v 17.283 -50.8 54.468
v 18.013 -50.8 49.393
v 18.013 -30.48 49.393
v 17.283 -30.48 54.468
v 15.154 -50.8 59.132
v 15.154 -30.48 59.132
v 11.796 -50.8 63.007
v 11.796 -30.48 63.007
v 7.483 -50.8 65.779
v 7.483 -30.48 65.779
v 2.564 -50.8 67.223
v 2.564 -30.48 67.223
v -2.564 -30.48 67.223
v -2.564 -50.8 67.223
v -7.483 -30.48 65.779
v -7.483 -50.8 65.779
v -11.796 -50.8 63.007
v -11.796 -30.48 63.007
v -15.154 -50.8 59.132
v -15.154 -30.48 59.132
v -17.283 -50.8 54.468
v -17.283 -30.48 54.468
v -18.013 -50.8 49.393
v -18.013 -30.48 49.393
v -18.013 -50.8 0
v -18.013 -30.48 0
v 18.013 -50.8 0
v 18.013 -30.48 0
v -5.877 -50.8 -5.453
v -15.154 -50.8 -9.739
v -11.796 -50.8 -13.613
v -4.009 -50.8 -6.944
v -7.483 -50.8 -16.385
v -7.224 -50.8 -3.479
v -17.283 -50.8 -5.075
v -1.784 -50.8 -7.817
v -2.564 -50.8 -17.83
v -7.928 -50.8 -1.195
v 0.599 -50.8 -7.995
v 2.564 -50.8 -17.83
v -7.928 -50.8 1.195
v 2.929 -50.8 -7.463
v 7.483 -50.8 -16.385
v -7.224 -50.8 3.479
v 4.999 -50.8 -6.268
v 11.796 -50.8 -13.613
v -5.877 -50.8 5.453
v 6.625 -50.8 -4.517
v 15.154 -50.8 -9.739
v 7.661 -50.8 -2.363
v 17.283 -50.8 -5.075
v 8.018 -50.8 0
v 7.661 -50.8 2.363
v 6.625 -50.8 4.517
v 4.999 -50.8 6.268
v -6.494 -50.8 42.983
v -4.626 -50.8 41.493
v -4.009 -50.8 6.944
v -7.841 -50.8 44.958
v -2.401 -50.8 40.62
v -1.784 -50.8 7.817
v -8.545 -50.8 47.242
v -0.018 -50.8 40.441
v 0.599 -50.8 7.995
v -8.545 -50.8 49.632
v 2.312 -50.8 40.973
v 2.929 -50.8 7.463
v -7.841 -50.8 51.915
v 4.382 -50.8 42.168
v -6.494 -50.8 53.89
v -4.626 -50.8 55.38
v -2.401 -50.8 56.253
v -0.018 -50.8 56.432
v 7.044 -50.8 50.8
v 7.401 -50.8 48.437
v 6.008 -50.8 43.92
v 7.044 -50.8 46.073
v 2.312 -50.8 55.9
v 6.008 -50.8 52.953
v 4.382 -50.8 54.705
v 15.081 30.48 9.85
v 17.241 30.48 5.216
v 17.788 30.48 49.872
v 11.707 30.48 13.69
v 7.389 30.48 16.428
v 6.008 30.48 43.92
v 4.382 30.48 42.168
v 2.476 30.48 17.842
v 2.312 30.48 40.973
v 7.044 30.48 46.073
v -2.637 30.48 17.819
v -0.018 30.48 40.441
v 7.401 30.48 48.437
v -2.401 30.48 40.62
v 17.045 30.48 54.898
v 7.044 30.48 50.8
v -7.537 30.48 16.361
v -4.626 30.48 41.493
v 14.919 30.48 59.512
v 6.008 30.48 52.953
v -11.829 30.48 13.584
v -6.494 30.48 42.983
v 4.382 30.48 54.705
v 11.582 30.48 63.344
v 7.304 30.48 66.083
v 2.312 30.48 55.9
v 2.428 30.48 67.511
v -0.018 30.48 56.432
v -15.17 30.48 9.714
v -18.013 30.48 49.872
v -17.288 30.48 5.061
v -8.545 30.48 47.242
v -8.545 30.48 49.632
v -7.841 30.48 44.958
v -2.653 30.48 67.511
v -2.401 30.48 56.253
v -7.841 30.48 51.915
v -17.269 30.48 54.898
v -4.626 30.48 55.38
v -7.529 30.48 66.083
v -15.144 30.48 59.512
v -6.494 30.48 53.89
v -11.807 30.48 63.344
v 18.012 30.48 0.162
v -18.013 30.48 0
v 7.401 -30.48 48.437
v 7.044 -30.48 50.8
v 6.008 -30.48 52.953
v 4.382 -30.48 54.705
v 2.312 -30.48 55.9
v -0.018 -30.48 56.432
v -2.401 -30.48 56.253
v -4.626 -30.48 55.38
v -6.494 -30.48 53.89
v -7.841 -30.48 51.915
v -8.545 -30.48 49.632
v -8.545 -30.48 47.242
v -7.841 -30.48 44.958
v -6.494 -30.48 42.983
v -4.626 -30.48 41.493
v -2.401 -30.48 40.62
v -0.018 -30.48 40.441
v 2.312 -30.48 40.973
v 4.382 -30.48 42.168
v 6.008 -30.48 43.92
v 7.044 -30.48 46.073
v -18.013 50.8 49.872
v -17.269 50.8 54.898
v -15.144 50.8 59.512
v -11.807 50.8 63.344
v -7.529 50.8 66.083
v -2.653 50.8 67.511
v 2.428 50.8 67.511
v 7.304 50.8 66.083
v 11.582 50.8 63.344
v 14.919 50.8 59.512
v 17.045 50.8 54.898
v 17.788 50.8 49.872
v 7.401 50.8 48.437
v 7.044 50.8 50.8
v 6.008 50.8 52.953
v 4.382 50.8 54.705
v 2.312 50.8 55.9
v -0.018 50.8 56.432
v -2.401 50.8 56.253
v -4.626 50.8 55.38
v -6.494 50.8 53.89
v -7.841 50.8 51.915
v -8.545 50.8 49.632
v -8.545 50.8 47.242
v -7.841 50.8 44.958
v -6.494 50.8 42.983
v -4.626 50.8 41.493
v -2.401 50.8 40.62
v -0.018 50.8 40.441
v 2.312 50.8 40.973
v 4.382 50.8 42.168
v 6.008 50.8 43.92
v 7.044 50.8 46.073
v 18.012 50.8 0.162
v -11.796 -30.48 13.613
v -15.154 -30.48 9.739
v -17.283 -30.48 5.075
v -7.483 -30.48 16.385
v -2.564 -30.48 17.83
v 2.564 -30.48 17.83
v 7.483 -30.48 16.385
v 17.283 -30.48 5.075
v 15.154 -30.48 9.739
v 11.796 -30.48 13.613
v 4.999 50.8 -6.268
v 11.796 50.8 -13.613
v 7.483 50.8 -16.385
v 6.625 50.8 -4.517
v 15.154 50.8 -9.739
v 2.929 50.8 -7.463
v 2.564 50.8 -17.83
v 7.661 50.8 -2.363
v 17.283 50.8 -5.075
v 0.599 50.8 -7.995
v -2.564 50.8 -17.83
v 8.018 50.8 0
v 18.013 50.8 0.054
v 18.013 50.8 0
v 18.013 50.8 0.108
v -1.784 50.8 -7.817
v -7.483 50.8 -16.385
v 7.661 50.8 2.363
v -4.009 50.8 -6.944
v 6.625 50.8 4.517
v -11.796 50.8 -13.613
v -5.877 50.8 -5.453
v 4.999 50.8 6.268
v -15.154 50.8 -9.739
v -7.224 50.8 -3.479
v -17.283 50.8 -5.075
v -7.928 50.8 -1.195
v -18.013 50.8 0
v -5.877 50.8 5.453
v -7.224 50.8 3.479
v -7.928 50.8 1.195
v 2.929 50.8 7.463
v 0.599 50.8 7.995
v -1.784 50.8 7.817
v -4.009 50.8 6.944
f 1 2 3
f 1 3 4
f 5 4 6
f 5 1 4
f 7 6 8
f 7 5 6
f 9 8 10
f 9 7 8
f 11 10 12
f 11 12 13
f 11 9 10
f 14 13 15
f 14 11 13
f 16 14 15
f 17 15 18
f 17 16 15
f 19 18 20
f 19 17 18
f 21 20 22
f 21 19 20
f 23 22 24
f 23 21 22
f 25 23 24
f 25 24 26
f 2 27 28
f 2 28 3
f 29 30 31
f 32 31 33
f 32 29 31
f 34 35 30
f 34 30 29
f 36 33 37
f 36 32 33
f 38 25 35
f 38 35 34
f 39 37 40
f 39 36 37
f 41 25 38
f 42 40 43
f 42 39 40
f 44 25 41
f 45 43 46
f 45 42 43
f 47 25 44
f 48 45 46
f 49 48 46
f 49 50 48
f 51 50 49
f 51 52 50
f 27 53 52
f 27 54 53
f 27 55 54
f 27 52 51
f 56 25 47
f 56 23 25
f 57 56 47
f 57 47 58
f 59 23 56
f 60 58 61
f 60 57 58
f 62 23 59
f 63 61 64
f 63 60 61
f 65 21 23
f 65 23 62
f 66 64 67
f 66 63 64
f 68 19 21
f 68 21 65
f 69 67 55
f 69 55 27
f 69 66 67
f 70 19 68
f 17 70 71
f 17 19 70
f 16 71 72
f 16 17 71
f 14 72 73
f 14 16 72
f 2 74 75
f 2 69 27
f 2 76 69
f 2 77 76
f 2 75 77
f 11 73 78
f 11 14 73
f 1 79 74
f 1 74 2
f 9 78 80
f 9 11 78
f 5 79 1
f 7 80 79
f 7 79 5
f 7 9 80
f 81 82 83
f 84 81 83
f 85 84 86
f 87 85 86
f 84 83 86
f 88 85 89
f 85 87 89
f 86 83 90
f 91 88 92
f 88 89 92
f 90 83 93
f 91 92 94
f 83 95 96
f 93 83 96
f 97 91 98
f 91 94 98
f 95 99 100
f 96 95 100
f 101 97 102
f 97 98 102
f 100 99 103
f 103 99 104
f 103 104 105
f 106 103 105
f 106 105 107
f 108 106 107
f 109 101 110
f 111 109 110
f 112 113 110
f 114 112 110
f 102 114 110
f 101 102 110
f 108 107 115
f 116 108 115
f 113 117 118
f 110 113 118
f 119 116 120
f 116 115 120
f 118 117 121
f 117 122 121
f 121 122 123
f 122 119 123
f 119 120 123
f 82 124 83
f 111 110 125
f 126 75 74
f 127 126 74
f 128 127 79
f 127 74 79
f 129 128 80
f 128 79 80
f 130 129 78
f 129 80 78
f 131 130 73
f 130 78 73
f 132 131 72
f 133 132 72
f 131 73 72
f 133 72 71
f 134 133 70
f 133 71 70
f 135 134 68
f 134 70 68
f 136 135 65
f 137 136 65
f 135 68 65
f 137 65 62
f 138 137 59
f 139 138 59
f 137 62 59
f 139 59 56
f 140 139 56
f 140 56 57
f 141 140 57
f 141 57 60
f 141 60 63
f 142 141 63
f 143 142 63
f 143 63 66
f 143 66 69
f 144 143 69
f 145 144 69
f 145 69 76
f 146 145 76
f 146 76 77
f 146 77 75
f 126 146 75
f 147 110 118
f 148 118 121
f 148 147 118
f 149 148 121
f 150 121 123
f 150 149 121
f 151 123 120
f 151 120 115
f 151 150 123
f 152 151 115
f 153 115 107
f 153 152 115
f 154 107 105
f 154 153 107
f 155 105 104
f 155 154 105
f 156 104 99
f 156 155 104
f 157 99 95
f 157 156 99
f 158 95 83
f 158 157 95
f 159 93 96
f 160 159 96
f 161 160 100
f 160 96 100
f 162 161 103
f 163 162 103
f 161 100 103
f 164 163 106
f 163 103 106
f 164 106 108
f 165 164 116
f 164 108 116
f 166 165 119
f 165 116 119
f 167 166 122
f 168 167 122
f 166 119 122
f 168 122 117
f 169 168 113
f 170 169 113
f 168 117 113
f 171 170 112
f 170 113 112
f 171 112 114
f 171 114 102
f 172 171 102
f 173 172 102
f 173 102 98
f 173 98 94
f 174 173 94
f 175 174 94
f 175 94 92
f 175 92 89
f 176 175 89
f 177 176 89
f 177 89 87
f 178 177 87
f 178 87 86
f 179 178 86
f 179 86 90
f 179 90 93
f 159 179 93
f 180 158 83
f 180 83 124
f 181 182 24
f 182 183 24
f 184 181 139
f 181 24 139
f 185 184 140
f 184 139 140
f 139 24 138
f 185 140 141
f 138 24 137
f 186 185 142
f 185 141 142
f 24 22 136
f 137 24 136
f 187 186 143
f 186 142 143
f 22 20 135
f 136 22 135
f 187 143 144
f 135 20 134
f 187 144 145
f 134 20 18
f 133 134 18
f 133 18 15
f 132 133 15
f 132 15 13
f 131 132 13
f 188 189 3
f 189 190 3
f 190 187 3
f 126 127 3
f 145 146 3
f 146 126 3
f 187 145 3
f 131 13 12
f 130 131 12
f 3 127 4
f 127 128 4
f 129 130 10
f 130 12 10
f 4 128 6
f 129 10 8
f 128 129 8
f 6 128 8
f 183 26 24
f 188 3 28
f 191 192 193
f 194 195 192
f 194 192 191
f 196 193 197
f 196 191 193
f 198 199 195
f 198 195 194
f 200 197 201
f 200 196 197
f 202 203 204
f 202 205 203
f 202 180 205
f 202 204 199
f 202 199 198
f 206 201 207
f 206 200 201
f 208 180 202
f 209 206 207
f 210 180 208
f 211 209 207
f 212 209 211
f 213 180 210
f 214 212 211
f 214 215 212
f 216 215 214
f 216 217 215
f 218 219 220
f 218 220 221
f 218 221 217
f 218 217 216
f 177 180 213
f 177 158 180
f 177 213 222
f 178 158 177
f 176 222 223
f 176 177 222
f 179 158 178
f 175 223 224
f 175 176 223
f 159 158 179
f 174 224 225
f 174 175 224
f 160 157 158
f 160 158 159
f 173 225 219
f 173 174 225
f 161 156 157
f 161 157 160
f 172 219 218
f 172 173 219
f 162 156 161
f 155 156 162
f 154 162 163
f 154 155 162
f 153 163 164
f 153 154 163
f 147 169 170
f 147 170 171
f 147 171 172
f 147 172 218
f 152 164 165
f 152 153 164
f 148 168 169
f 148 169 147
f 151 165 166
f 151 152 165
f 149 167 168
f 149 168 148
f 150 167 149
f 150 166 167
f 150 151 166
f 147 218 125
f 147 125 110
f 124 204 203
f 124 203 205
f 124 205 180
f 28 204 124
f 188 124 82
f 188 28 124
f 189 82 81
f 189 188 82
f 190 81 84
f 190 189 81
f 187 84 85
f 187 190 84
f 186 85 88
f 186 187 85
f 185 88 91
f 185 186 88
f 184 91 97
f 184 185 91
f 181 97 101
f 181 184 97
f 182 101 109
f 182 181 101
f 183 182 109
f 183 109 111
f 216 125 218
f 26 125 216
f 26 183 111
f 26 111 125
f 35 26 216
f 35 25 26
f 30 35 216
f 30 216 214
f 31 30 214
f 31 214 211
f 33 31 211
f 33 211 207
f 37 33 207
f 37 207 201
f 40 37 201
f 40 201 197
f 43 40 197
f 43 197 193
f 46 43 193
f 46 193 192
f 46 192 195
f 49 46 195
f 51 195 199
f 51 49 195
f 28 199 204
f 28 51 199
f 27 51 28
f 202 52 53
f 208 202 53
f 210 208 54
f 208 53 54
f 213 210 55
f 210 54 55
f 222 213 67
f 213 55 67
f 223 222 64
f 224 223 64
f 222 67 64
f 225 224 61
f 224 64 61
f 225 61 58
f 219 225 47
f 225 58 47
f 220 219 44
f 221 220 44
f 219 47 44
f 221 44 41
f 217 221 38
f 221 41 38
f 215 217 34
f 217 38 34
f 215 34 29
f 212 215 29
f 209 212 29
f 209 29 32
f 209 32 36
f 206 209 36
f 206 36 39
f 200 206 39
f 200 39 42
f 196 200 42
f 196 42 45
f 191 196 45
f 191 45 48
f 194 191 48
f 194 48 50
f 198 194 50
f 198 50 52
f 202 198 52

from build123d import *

# Parameters (mm, degrees)
F0_R          = 18.013064
F1_DEPTH      = 50.8
F1_DEPTH_BACK = 50.8
F3_DEPTH      = 20.32
F5_DEPTH      = 20.32
F6_R          = 8.017692
F7_DEPTH      = 101.601


with BuildPart() as f1:
    # F0 (on Front) → F1 (new body, two sides)
    with BuildSketch(Plane.XZ) as f1_sk:
        Circle(F0_R)
    extrude(amount=F1_DEPTH)
    extrude(f1_sk.sketch, amount=-F1_DEPTH_BACK)

    # F2 (on face) → F3 (join)
    with BuildSketch(Plane.XZ.offset(50.8)):
        Polygon((-18.013064, 49.393319), (-18.013064, 0), (18.013064, 0), (18.013064, 49.393319), (0, 49.393319), align=None)
        with BuildLine():
            Line((18.013064, 0), (-18.013064, 0))
            ThreePointArc((-18.013064, 0), (0, -18.013064), (18.013064, 0))
        make_face()
        with BuildLine():
            ThreePointArc((18.013064, 49.393319), (0, 67.406383), (-18.013064, 49.393319))
            Line((-18.013064, 49.393319), (0, 49.393319))
            Line((0, 49.393319), (18.013064, 49.393319))
        make_face()
    extrude(amount=-F3_DEPTH)

    # F4 (on face) → F5 (join)
    with BuildSketch(Plane(origin=(0, 50.8, 0), x_dir=(-1, 0, 0), z_dir=(0, 1, 0))):
        Polygon((-17.788198, 49.871705), (-18.013064, 0), (18.013064, 0), (18.013064, 49.871705), align=None)
        with BuildLine():
            ThreePointArc((18.013064, 49.871705), (0.112433, 67.691806), (-17.788198, 49.871705))
            Line((-17.788198, 49.871705), (18.013064, 49.871705))
        make_face()
    extrude(amount=-F5_DEPTH)

    # F6 (on face) → F7 (cut, through all)
    with BuildSketch(Plane.XZ.offset(50.8)):
        Circle(F6_R)
        with Locations((-0.617001, 48.436549)):
            Circle(F6_R)
    extrude(amount=-F7_DEPTH, mode=Mode.SUBTRACT)


solid = f1.part
